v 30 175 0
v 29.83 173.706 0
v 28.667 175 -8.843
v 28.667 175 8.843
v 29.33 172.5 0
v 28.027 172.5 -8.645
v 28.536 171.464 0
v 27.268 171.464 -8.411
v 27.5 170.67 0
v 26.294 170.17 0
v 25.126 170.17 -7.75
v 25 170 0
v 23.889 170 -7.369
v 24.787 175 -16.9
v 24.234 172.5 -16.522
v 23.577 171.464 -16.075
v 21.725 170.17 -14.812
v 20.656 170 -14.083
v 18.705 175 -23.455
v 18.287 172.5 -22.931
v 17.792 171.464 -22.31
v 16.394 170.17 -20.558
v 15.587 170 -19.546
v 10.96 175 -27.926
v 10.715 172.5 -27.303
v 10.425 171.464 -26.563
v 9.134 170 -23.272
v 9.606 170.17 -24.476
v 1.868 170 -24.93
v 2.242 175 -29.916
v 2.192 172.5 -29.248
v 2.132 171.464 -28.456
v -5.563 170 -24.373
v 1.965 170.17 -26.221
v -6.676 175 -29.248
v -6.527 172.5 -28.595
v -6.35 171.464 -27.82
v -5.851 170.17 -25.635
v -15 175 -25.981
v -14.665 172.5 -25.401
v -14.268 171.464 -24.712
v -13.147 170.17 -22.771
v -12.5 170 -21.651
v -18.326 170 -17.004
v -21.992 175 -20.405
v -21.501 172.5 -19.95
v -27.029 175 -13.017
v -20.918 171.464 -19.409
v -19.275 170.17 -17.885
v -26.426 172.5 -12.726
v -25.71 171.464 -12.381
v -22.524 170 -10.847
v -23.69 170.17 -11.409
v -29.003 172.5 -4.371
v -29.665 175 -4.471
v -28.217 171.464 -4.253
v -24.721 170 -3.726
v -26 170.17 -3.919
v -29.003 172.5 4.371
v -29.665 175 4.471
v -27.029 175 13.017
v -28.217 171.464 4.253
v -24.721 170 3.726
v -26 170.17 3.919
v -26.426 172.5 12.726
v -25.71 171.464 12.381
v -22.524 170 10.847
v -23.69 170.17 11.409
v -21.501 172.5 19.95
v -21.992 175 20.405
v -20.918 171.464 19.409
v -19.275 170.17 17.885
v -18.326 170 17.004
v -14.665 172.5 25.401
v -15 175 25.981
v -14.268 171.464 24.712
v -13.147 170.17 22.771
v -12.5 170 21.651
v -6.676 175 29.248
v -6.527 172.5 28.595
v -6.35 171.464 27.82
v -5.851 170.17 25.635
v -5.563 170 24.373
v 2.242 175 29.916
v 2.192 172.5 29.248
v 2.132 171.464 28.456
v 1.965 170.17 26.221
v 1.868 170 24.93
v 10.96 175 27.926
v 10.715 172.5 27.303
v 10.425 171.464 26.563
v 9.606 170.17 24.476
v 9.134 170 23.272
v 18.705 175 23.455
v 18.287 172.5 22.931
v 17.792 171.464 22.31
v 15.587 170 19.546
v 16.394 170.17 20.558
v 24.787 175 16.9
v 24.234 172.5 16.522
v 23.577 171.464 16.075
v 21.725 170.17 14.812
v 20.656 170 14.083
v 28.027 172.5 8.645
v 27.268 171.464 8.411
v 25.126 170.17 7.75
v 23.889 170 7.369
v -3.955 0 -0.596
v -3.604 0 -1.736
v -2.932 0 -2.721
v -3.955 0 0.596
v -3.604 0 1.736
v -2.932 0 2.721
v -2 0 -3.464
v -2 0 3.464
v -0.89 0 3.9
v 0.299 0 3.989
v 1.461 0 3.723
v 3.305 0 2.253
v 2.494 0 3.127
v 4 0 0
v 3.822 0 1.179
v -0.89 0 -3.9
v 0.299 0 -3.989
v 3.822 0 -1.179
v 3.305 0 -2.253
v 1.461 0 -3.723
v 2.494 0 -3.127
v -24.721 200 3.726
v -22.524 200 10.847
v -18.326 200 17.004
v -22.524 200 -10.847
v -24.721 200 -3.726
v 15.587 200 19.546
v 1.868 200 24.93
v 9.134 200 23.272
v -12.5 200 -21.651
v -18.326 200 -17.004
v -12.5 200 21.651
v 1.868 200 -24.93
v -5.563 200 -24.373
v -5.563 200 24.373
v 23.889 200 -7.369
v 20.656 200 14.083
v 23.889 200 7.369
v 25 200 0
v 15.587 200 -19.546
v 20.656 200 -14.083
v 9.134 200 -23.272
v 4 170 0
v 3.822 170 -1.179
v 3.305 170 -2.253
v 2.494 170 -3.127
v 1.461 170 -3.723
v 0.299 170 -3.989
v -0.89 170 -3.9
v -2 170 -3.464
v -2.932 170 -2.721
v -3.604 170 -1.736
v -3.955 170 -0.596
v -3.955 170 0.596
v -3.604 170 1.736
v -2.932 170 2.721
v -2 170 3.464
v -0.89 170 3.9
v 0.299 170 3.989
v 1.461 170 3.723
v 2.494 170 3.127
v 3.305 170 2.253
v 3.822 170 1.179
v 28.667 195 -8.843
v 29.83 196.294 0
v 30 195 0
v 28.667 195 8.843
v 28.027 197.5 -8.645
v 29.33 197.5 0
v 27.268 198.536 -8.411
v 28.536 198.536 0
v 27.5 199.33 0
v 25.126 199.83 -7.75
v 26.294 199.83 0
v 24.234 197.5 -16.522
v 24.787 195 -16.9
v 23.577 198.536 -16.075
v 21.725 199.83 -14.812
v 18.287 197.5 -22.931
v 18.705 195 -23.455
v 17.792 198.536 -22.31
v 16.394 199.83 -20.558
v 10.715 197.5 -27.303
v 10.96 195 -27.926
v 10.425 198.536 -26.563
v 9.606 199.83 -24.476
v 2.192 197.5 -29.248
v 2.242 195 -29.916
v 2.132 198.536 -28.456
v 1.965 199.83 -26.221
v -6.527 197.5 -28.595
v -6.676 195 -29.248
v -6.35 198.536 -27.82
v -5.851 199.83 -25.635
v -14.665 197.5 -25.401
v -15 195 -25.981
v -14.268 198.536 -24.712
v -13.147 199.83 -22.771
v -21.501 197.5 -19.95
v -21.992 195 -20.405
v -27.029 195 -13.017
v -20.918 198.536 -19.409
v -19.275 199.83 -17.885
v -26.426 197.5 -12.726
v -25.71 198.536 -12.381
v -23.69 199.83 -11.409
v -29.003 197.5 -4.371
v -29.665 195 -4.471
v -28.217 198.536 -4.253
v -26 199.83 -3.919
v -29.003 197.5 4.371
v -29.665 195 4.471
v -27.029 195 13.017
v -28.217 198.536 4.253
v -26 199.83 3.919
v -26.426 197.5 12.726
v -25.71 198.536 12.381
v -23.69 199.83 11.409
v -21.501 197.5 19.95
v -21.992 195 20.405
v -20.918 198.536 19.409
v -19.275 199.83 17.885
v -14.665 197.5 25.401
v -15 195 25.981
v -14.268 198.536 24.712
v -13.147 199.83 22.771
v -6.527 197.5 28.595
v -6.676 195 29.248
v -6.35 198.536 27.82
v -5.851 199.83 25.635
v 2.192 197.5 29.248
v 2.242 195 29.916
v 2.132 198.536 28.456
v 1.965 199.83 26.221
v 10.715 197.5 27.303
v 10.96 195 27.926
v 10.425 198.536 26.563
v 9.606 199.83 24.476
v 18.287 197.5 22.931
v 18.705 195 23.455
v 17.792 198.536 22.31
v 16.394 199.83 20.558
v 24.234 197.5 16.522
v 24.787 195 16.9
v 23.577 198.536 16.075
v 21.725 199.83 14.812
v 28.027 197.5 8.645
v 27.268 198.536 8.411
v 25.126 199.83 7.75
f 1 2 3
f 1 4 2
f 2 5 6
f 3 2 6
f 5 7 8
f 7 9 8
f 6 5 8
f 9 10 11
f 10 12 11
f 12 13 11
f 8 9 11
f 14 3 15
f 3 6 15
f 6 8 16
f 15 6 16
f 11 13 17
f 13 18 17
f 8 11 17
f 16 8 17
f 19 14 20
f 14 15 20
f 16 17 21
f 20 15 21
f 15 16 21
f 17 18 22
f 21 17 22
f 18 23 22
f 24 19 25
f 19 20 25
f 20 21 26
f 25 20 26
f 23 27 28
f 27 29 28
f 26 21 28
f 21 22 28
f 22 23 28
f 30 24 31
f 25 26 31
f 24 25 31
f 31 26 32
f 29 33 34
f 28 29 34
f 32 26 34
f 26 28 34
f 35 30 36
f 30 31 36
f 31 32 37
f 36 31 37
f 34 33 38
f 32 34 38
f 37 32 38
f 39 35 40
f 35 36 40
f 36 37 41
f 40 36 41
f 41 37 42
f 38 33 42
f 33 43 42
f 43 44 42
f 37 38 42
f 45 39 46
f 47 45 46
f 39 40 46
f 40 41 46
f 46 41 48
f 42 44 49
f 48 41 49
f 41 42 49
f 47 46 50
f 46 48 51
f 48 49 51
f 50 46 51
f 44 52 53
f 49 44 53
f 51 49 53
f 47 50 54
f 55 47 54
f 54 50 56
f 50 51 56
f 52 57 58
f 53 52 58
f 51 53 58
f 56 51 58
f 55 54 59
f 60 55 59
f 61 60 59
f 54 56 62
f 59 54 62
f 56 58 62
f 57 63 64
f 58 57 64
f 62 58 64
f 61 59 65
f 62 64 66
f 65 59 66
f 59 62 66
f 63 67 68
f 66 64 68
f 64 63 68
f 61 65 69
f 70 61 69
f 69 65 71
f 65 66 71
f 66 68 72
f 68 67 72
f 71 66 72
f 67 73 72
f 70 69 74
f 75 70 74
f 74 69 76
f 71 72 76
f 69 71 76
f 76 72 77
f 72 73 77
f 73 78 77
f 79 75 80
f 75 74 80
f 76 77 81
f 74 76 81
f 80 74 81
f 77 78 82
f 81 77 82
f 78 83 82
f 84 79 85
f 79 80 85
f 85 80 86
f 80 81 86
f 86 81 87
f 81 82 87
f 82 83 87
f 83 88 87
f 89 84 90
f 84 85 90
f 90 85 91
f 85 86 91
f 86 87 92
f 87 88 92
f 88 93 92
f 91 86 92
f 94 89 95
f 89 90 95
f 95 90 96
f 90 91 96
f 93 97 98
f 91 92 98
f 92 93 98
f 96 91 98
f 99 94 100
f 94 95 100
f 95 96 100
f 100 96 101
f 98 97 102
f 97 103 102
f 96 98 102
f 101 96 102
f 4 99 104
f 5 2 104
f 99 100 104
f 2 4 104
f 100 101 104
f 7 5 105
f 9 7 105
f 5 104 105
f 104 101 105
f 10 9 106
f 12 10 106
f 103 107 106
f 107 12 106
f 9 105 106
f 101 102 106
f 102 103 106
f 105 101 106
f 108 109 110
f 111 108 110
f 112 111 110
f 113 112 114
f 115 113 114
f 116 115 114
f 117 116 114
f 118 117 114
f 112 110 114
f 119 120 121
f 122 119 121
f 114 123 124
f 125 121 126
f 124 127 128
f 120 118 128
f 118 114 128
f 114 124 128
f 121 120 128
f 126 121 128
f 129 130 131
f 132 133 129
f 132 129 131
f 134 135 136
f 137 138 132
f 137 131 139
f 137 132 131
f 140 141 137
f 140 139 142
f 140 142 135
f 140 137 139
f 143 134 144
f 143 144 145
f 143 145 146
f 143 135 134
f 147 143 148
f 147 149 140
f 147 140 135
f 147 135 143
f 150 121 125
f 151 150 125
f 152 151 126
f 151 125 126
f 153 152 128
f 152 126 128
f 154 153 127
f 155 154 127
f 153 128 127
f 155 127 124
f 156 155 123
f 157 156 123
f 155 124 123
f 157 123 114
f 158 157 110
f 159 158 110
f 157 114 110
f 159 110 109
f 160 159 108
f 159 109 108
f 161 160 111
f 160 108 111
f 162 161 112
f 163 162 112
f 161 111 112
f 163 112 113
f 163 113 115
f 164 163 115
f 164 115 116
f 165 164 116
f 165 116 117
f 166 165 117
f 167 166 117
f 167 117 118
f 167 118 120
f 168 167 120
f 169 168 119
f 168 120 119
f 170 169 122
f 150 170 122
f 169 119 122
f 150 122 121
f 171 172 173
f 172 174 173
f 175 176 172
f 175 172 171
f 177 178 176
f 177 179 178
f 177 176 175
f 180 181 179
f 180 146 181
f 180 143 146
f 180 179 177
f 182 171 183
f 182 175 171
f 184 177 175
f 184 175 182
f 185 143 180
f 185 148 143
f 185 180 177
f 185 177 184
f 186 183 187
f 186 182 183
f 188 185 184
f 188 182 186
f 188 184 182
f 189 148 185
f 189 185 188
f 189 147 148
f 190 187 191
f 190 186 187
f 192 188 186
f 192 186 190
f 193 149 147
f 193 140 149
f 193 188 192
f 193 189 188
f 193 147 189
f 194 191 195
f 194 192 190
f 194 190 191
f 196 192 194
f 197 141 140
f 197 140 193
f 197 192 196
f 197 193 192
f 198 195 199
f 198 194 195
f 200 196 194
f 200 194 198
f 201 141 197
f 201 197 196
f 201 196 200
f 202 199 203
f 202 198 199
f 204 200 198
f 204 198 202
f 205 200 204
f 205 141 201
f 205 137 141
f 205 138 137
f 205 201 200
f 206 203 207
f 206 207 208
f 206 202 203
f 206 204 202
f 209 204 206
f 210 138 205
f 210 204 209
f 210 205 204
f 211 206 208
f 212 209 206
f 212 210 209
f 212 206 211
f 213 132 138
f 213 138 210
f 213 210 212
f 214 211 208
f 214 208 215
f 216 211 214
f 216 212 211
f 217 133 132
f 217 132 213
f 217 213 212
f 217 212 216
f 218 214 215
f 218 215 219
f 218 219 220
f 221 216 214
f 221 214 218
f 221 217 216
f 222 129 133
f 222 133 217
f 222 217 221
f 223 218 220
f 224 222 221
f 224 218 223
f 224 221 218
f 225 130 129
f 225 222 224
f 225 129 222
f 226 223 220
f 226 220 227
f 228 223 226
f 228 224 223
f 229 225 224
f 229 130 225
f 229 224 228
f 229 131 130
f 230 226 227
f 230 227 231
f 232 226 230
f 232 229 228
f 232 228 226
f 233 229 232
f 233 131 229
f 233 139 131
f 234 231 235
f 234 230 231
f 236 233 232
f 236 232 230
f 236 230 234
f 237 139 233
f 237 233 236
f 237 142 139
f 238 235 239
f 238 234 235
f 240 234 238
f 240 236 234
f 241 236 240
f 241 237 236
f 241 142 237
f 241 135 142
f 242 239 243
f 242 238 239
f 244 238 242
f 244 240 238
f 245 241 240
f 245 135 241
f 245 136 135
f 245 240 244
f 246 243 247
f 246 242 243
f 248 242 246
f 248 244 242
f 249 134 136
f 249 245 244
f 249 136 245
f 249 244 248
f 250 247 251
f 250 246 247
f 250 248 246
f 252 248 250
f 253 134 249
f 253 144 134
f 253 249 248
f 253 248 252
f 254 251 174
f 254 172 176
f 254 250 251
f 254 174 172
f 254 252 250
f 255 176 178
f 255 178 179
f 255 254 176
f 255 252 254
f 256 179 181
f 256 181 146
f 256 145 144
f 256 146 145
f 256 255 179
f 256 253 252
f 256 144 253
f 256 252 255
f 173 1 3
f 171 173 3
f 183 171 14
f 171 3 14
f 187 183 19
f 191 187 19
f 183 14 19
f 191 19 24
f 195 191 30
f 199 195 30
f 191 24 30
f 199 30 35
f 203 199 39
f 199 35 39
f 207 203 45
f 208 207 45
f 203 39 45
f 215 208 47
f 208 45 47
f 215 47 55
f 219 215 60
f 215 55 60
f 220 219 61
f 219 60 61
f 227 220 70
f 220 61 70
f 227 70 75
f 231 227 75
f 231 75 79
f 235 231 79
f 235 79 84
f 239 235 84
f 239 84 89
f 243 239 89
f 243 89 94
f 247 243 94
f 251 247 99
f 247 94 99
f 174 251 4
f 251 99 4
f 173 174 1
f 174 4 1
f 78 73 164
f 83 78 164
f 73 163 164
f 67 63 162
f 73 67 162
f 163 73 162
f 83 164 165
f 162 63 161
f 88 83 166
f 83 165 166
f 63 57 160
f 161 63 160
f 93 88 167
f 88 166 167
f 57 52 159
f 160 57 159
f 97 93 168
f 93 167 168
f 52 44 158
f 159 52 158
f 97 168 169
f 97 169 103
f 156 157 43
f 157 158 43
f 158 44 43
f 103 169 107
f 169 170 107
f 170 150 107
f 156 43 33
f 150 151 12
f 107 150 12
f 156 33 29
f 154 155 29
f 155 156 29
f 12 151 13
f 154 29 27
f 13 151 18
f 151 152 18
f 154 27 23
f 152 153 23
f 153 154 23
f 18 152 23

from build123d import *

# Parameters (mm, degrees)
SKETCH1_R           = 4
BOSS_EXTRUDE1_DEPTH = 170
SKETCH2_R           = 30
BOSS_EXTRUDE2_DEPTH = 30
FILLET1_R           = 5


with BuildPart() as part:
    # Sketch1 → Boss-Extrude1 (new body)
    with BuildSketch(Plane(origin=(0, 0, 0), x_dir=(1, 0, 0), z_dir=(0, 1, 0))):
        Circle(SKETCH1_R)
    extrude(amount=BOSS_EXTRUDE1_DEPTH)

    # Sketch2 → Boss-Extrude2 (add)
    with BuildSketch(Plane(origin=(0, 170, 0), x_dir=(1, 0, 0), z_dir=(0, 1, 0))):
        Circle(SKETCH2_R)
    extrude(amount=BOSS_EXTRUDE2_DEPTH)

    # Fillet1
    fillet1_edges = [part.edges().sort_by_distance(p)[0] for p in [
        (-30, 170, 0),
        (-30, 200, 0),
    ]]
    fillet(fillet1_edges, radius=FILLET1_R)


solid = part.part
